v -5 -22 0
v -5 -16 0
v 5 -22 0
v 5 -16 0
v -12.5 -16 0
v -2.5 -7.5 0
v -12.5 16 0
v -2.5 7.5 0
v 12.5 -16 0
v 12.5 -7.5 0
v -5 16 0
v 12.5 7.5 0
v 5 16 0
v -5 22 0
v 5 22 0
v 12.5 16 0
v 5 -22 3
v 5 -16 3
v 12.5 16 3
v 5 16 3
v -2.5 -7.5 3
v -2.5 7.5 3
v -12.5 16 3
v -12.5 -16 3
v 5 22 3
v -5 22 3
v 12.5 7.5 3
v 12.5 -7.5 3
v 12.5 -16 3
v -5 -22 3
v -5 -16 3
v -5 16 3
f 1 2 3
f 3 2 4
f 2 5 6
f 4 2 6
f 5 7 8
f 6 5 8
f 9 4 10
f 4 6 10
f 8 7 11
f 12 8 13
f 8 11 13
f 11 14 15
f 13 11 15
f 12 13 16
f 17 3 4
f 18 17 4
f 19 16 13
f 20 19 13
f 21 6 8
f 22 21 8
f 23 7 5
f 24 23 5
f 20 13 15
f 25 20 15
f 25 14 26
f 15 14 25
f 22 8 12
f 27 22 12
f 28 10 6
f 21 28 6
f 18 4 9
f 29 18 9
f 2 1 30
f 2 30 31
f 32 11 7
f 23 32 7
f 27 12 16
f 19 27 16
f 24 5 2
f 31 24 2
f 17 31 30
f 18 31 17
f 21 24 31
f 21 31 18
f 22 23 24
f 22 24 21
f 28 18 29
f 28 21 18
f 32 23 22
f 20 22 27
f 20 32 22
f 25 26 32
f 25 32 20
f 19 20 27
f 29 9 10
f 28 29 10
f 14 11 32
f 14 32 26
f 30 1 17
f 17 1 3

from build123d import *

# Parameters (mm, degrees)
ESBO_O1_W                = 10
ESBO_O1_H                = 6
RESSALTO_EXTRUS_O1_DEPTH = 3


with BuildPart() as part:
    # Esboço1 → Ressalto-extrusão1 (new body)
    with BuildSketch(Plane.XY):
        Polygon((-12.5, 16), (-12.5, -16), (-5, -16), (5, -16), (12.5, -16), (12.5, -7.5), (-2.5, -7.5), (-2.5, 7.5), (12.5, 7.5), (12.5, 16), (5, 16), (-5, 16), align=None)
        with Locations((0, 19)):
            Rectangle(ESBO_O1_W, ESBO_O1_H)
        with Locations((0, -19)):
            Rectangle(ESBO_O1_W, ESBO_O1_H)
    extrude(amount=RESSALTO_EXTRUS_O1_DEPTH)


solid = part.part
